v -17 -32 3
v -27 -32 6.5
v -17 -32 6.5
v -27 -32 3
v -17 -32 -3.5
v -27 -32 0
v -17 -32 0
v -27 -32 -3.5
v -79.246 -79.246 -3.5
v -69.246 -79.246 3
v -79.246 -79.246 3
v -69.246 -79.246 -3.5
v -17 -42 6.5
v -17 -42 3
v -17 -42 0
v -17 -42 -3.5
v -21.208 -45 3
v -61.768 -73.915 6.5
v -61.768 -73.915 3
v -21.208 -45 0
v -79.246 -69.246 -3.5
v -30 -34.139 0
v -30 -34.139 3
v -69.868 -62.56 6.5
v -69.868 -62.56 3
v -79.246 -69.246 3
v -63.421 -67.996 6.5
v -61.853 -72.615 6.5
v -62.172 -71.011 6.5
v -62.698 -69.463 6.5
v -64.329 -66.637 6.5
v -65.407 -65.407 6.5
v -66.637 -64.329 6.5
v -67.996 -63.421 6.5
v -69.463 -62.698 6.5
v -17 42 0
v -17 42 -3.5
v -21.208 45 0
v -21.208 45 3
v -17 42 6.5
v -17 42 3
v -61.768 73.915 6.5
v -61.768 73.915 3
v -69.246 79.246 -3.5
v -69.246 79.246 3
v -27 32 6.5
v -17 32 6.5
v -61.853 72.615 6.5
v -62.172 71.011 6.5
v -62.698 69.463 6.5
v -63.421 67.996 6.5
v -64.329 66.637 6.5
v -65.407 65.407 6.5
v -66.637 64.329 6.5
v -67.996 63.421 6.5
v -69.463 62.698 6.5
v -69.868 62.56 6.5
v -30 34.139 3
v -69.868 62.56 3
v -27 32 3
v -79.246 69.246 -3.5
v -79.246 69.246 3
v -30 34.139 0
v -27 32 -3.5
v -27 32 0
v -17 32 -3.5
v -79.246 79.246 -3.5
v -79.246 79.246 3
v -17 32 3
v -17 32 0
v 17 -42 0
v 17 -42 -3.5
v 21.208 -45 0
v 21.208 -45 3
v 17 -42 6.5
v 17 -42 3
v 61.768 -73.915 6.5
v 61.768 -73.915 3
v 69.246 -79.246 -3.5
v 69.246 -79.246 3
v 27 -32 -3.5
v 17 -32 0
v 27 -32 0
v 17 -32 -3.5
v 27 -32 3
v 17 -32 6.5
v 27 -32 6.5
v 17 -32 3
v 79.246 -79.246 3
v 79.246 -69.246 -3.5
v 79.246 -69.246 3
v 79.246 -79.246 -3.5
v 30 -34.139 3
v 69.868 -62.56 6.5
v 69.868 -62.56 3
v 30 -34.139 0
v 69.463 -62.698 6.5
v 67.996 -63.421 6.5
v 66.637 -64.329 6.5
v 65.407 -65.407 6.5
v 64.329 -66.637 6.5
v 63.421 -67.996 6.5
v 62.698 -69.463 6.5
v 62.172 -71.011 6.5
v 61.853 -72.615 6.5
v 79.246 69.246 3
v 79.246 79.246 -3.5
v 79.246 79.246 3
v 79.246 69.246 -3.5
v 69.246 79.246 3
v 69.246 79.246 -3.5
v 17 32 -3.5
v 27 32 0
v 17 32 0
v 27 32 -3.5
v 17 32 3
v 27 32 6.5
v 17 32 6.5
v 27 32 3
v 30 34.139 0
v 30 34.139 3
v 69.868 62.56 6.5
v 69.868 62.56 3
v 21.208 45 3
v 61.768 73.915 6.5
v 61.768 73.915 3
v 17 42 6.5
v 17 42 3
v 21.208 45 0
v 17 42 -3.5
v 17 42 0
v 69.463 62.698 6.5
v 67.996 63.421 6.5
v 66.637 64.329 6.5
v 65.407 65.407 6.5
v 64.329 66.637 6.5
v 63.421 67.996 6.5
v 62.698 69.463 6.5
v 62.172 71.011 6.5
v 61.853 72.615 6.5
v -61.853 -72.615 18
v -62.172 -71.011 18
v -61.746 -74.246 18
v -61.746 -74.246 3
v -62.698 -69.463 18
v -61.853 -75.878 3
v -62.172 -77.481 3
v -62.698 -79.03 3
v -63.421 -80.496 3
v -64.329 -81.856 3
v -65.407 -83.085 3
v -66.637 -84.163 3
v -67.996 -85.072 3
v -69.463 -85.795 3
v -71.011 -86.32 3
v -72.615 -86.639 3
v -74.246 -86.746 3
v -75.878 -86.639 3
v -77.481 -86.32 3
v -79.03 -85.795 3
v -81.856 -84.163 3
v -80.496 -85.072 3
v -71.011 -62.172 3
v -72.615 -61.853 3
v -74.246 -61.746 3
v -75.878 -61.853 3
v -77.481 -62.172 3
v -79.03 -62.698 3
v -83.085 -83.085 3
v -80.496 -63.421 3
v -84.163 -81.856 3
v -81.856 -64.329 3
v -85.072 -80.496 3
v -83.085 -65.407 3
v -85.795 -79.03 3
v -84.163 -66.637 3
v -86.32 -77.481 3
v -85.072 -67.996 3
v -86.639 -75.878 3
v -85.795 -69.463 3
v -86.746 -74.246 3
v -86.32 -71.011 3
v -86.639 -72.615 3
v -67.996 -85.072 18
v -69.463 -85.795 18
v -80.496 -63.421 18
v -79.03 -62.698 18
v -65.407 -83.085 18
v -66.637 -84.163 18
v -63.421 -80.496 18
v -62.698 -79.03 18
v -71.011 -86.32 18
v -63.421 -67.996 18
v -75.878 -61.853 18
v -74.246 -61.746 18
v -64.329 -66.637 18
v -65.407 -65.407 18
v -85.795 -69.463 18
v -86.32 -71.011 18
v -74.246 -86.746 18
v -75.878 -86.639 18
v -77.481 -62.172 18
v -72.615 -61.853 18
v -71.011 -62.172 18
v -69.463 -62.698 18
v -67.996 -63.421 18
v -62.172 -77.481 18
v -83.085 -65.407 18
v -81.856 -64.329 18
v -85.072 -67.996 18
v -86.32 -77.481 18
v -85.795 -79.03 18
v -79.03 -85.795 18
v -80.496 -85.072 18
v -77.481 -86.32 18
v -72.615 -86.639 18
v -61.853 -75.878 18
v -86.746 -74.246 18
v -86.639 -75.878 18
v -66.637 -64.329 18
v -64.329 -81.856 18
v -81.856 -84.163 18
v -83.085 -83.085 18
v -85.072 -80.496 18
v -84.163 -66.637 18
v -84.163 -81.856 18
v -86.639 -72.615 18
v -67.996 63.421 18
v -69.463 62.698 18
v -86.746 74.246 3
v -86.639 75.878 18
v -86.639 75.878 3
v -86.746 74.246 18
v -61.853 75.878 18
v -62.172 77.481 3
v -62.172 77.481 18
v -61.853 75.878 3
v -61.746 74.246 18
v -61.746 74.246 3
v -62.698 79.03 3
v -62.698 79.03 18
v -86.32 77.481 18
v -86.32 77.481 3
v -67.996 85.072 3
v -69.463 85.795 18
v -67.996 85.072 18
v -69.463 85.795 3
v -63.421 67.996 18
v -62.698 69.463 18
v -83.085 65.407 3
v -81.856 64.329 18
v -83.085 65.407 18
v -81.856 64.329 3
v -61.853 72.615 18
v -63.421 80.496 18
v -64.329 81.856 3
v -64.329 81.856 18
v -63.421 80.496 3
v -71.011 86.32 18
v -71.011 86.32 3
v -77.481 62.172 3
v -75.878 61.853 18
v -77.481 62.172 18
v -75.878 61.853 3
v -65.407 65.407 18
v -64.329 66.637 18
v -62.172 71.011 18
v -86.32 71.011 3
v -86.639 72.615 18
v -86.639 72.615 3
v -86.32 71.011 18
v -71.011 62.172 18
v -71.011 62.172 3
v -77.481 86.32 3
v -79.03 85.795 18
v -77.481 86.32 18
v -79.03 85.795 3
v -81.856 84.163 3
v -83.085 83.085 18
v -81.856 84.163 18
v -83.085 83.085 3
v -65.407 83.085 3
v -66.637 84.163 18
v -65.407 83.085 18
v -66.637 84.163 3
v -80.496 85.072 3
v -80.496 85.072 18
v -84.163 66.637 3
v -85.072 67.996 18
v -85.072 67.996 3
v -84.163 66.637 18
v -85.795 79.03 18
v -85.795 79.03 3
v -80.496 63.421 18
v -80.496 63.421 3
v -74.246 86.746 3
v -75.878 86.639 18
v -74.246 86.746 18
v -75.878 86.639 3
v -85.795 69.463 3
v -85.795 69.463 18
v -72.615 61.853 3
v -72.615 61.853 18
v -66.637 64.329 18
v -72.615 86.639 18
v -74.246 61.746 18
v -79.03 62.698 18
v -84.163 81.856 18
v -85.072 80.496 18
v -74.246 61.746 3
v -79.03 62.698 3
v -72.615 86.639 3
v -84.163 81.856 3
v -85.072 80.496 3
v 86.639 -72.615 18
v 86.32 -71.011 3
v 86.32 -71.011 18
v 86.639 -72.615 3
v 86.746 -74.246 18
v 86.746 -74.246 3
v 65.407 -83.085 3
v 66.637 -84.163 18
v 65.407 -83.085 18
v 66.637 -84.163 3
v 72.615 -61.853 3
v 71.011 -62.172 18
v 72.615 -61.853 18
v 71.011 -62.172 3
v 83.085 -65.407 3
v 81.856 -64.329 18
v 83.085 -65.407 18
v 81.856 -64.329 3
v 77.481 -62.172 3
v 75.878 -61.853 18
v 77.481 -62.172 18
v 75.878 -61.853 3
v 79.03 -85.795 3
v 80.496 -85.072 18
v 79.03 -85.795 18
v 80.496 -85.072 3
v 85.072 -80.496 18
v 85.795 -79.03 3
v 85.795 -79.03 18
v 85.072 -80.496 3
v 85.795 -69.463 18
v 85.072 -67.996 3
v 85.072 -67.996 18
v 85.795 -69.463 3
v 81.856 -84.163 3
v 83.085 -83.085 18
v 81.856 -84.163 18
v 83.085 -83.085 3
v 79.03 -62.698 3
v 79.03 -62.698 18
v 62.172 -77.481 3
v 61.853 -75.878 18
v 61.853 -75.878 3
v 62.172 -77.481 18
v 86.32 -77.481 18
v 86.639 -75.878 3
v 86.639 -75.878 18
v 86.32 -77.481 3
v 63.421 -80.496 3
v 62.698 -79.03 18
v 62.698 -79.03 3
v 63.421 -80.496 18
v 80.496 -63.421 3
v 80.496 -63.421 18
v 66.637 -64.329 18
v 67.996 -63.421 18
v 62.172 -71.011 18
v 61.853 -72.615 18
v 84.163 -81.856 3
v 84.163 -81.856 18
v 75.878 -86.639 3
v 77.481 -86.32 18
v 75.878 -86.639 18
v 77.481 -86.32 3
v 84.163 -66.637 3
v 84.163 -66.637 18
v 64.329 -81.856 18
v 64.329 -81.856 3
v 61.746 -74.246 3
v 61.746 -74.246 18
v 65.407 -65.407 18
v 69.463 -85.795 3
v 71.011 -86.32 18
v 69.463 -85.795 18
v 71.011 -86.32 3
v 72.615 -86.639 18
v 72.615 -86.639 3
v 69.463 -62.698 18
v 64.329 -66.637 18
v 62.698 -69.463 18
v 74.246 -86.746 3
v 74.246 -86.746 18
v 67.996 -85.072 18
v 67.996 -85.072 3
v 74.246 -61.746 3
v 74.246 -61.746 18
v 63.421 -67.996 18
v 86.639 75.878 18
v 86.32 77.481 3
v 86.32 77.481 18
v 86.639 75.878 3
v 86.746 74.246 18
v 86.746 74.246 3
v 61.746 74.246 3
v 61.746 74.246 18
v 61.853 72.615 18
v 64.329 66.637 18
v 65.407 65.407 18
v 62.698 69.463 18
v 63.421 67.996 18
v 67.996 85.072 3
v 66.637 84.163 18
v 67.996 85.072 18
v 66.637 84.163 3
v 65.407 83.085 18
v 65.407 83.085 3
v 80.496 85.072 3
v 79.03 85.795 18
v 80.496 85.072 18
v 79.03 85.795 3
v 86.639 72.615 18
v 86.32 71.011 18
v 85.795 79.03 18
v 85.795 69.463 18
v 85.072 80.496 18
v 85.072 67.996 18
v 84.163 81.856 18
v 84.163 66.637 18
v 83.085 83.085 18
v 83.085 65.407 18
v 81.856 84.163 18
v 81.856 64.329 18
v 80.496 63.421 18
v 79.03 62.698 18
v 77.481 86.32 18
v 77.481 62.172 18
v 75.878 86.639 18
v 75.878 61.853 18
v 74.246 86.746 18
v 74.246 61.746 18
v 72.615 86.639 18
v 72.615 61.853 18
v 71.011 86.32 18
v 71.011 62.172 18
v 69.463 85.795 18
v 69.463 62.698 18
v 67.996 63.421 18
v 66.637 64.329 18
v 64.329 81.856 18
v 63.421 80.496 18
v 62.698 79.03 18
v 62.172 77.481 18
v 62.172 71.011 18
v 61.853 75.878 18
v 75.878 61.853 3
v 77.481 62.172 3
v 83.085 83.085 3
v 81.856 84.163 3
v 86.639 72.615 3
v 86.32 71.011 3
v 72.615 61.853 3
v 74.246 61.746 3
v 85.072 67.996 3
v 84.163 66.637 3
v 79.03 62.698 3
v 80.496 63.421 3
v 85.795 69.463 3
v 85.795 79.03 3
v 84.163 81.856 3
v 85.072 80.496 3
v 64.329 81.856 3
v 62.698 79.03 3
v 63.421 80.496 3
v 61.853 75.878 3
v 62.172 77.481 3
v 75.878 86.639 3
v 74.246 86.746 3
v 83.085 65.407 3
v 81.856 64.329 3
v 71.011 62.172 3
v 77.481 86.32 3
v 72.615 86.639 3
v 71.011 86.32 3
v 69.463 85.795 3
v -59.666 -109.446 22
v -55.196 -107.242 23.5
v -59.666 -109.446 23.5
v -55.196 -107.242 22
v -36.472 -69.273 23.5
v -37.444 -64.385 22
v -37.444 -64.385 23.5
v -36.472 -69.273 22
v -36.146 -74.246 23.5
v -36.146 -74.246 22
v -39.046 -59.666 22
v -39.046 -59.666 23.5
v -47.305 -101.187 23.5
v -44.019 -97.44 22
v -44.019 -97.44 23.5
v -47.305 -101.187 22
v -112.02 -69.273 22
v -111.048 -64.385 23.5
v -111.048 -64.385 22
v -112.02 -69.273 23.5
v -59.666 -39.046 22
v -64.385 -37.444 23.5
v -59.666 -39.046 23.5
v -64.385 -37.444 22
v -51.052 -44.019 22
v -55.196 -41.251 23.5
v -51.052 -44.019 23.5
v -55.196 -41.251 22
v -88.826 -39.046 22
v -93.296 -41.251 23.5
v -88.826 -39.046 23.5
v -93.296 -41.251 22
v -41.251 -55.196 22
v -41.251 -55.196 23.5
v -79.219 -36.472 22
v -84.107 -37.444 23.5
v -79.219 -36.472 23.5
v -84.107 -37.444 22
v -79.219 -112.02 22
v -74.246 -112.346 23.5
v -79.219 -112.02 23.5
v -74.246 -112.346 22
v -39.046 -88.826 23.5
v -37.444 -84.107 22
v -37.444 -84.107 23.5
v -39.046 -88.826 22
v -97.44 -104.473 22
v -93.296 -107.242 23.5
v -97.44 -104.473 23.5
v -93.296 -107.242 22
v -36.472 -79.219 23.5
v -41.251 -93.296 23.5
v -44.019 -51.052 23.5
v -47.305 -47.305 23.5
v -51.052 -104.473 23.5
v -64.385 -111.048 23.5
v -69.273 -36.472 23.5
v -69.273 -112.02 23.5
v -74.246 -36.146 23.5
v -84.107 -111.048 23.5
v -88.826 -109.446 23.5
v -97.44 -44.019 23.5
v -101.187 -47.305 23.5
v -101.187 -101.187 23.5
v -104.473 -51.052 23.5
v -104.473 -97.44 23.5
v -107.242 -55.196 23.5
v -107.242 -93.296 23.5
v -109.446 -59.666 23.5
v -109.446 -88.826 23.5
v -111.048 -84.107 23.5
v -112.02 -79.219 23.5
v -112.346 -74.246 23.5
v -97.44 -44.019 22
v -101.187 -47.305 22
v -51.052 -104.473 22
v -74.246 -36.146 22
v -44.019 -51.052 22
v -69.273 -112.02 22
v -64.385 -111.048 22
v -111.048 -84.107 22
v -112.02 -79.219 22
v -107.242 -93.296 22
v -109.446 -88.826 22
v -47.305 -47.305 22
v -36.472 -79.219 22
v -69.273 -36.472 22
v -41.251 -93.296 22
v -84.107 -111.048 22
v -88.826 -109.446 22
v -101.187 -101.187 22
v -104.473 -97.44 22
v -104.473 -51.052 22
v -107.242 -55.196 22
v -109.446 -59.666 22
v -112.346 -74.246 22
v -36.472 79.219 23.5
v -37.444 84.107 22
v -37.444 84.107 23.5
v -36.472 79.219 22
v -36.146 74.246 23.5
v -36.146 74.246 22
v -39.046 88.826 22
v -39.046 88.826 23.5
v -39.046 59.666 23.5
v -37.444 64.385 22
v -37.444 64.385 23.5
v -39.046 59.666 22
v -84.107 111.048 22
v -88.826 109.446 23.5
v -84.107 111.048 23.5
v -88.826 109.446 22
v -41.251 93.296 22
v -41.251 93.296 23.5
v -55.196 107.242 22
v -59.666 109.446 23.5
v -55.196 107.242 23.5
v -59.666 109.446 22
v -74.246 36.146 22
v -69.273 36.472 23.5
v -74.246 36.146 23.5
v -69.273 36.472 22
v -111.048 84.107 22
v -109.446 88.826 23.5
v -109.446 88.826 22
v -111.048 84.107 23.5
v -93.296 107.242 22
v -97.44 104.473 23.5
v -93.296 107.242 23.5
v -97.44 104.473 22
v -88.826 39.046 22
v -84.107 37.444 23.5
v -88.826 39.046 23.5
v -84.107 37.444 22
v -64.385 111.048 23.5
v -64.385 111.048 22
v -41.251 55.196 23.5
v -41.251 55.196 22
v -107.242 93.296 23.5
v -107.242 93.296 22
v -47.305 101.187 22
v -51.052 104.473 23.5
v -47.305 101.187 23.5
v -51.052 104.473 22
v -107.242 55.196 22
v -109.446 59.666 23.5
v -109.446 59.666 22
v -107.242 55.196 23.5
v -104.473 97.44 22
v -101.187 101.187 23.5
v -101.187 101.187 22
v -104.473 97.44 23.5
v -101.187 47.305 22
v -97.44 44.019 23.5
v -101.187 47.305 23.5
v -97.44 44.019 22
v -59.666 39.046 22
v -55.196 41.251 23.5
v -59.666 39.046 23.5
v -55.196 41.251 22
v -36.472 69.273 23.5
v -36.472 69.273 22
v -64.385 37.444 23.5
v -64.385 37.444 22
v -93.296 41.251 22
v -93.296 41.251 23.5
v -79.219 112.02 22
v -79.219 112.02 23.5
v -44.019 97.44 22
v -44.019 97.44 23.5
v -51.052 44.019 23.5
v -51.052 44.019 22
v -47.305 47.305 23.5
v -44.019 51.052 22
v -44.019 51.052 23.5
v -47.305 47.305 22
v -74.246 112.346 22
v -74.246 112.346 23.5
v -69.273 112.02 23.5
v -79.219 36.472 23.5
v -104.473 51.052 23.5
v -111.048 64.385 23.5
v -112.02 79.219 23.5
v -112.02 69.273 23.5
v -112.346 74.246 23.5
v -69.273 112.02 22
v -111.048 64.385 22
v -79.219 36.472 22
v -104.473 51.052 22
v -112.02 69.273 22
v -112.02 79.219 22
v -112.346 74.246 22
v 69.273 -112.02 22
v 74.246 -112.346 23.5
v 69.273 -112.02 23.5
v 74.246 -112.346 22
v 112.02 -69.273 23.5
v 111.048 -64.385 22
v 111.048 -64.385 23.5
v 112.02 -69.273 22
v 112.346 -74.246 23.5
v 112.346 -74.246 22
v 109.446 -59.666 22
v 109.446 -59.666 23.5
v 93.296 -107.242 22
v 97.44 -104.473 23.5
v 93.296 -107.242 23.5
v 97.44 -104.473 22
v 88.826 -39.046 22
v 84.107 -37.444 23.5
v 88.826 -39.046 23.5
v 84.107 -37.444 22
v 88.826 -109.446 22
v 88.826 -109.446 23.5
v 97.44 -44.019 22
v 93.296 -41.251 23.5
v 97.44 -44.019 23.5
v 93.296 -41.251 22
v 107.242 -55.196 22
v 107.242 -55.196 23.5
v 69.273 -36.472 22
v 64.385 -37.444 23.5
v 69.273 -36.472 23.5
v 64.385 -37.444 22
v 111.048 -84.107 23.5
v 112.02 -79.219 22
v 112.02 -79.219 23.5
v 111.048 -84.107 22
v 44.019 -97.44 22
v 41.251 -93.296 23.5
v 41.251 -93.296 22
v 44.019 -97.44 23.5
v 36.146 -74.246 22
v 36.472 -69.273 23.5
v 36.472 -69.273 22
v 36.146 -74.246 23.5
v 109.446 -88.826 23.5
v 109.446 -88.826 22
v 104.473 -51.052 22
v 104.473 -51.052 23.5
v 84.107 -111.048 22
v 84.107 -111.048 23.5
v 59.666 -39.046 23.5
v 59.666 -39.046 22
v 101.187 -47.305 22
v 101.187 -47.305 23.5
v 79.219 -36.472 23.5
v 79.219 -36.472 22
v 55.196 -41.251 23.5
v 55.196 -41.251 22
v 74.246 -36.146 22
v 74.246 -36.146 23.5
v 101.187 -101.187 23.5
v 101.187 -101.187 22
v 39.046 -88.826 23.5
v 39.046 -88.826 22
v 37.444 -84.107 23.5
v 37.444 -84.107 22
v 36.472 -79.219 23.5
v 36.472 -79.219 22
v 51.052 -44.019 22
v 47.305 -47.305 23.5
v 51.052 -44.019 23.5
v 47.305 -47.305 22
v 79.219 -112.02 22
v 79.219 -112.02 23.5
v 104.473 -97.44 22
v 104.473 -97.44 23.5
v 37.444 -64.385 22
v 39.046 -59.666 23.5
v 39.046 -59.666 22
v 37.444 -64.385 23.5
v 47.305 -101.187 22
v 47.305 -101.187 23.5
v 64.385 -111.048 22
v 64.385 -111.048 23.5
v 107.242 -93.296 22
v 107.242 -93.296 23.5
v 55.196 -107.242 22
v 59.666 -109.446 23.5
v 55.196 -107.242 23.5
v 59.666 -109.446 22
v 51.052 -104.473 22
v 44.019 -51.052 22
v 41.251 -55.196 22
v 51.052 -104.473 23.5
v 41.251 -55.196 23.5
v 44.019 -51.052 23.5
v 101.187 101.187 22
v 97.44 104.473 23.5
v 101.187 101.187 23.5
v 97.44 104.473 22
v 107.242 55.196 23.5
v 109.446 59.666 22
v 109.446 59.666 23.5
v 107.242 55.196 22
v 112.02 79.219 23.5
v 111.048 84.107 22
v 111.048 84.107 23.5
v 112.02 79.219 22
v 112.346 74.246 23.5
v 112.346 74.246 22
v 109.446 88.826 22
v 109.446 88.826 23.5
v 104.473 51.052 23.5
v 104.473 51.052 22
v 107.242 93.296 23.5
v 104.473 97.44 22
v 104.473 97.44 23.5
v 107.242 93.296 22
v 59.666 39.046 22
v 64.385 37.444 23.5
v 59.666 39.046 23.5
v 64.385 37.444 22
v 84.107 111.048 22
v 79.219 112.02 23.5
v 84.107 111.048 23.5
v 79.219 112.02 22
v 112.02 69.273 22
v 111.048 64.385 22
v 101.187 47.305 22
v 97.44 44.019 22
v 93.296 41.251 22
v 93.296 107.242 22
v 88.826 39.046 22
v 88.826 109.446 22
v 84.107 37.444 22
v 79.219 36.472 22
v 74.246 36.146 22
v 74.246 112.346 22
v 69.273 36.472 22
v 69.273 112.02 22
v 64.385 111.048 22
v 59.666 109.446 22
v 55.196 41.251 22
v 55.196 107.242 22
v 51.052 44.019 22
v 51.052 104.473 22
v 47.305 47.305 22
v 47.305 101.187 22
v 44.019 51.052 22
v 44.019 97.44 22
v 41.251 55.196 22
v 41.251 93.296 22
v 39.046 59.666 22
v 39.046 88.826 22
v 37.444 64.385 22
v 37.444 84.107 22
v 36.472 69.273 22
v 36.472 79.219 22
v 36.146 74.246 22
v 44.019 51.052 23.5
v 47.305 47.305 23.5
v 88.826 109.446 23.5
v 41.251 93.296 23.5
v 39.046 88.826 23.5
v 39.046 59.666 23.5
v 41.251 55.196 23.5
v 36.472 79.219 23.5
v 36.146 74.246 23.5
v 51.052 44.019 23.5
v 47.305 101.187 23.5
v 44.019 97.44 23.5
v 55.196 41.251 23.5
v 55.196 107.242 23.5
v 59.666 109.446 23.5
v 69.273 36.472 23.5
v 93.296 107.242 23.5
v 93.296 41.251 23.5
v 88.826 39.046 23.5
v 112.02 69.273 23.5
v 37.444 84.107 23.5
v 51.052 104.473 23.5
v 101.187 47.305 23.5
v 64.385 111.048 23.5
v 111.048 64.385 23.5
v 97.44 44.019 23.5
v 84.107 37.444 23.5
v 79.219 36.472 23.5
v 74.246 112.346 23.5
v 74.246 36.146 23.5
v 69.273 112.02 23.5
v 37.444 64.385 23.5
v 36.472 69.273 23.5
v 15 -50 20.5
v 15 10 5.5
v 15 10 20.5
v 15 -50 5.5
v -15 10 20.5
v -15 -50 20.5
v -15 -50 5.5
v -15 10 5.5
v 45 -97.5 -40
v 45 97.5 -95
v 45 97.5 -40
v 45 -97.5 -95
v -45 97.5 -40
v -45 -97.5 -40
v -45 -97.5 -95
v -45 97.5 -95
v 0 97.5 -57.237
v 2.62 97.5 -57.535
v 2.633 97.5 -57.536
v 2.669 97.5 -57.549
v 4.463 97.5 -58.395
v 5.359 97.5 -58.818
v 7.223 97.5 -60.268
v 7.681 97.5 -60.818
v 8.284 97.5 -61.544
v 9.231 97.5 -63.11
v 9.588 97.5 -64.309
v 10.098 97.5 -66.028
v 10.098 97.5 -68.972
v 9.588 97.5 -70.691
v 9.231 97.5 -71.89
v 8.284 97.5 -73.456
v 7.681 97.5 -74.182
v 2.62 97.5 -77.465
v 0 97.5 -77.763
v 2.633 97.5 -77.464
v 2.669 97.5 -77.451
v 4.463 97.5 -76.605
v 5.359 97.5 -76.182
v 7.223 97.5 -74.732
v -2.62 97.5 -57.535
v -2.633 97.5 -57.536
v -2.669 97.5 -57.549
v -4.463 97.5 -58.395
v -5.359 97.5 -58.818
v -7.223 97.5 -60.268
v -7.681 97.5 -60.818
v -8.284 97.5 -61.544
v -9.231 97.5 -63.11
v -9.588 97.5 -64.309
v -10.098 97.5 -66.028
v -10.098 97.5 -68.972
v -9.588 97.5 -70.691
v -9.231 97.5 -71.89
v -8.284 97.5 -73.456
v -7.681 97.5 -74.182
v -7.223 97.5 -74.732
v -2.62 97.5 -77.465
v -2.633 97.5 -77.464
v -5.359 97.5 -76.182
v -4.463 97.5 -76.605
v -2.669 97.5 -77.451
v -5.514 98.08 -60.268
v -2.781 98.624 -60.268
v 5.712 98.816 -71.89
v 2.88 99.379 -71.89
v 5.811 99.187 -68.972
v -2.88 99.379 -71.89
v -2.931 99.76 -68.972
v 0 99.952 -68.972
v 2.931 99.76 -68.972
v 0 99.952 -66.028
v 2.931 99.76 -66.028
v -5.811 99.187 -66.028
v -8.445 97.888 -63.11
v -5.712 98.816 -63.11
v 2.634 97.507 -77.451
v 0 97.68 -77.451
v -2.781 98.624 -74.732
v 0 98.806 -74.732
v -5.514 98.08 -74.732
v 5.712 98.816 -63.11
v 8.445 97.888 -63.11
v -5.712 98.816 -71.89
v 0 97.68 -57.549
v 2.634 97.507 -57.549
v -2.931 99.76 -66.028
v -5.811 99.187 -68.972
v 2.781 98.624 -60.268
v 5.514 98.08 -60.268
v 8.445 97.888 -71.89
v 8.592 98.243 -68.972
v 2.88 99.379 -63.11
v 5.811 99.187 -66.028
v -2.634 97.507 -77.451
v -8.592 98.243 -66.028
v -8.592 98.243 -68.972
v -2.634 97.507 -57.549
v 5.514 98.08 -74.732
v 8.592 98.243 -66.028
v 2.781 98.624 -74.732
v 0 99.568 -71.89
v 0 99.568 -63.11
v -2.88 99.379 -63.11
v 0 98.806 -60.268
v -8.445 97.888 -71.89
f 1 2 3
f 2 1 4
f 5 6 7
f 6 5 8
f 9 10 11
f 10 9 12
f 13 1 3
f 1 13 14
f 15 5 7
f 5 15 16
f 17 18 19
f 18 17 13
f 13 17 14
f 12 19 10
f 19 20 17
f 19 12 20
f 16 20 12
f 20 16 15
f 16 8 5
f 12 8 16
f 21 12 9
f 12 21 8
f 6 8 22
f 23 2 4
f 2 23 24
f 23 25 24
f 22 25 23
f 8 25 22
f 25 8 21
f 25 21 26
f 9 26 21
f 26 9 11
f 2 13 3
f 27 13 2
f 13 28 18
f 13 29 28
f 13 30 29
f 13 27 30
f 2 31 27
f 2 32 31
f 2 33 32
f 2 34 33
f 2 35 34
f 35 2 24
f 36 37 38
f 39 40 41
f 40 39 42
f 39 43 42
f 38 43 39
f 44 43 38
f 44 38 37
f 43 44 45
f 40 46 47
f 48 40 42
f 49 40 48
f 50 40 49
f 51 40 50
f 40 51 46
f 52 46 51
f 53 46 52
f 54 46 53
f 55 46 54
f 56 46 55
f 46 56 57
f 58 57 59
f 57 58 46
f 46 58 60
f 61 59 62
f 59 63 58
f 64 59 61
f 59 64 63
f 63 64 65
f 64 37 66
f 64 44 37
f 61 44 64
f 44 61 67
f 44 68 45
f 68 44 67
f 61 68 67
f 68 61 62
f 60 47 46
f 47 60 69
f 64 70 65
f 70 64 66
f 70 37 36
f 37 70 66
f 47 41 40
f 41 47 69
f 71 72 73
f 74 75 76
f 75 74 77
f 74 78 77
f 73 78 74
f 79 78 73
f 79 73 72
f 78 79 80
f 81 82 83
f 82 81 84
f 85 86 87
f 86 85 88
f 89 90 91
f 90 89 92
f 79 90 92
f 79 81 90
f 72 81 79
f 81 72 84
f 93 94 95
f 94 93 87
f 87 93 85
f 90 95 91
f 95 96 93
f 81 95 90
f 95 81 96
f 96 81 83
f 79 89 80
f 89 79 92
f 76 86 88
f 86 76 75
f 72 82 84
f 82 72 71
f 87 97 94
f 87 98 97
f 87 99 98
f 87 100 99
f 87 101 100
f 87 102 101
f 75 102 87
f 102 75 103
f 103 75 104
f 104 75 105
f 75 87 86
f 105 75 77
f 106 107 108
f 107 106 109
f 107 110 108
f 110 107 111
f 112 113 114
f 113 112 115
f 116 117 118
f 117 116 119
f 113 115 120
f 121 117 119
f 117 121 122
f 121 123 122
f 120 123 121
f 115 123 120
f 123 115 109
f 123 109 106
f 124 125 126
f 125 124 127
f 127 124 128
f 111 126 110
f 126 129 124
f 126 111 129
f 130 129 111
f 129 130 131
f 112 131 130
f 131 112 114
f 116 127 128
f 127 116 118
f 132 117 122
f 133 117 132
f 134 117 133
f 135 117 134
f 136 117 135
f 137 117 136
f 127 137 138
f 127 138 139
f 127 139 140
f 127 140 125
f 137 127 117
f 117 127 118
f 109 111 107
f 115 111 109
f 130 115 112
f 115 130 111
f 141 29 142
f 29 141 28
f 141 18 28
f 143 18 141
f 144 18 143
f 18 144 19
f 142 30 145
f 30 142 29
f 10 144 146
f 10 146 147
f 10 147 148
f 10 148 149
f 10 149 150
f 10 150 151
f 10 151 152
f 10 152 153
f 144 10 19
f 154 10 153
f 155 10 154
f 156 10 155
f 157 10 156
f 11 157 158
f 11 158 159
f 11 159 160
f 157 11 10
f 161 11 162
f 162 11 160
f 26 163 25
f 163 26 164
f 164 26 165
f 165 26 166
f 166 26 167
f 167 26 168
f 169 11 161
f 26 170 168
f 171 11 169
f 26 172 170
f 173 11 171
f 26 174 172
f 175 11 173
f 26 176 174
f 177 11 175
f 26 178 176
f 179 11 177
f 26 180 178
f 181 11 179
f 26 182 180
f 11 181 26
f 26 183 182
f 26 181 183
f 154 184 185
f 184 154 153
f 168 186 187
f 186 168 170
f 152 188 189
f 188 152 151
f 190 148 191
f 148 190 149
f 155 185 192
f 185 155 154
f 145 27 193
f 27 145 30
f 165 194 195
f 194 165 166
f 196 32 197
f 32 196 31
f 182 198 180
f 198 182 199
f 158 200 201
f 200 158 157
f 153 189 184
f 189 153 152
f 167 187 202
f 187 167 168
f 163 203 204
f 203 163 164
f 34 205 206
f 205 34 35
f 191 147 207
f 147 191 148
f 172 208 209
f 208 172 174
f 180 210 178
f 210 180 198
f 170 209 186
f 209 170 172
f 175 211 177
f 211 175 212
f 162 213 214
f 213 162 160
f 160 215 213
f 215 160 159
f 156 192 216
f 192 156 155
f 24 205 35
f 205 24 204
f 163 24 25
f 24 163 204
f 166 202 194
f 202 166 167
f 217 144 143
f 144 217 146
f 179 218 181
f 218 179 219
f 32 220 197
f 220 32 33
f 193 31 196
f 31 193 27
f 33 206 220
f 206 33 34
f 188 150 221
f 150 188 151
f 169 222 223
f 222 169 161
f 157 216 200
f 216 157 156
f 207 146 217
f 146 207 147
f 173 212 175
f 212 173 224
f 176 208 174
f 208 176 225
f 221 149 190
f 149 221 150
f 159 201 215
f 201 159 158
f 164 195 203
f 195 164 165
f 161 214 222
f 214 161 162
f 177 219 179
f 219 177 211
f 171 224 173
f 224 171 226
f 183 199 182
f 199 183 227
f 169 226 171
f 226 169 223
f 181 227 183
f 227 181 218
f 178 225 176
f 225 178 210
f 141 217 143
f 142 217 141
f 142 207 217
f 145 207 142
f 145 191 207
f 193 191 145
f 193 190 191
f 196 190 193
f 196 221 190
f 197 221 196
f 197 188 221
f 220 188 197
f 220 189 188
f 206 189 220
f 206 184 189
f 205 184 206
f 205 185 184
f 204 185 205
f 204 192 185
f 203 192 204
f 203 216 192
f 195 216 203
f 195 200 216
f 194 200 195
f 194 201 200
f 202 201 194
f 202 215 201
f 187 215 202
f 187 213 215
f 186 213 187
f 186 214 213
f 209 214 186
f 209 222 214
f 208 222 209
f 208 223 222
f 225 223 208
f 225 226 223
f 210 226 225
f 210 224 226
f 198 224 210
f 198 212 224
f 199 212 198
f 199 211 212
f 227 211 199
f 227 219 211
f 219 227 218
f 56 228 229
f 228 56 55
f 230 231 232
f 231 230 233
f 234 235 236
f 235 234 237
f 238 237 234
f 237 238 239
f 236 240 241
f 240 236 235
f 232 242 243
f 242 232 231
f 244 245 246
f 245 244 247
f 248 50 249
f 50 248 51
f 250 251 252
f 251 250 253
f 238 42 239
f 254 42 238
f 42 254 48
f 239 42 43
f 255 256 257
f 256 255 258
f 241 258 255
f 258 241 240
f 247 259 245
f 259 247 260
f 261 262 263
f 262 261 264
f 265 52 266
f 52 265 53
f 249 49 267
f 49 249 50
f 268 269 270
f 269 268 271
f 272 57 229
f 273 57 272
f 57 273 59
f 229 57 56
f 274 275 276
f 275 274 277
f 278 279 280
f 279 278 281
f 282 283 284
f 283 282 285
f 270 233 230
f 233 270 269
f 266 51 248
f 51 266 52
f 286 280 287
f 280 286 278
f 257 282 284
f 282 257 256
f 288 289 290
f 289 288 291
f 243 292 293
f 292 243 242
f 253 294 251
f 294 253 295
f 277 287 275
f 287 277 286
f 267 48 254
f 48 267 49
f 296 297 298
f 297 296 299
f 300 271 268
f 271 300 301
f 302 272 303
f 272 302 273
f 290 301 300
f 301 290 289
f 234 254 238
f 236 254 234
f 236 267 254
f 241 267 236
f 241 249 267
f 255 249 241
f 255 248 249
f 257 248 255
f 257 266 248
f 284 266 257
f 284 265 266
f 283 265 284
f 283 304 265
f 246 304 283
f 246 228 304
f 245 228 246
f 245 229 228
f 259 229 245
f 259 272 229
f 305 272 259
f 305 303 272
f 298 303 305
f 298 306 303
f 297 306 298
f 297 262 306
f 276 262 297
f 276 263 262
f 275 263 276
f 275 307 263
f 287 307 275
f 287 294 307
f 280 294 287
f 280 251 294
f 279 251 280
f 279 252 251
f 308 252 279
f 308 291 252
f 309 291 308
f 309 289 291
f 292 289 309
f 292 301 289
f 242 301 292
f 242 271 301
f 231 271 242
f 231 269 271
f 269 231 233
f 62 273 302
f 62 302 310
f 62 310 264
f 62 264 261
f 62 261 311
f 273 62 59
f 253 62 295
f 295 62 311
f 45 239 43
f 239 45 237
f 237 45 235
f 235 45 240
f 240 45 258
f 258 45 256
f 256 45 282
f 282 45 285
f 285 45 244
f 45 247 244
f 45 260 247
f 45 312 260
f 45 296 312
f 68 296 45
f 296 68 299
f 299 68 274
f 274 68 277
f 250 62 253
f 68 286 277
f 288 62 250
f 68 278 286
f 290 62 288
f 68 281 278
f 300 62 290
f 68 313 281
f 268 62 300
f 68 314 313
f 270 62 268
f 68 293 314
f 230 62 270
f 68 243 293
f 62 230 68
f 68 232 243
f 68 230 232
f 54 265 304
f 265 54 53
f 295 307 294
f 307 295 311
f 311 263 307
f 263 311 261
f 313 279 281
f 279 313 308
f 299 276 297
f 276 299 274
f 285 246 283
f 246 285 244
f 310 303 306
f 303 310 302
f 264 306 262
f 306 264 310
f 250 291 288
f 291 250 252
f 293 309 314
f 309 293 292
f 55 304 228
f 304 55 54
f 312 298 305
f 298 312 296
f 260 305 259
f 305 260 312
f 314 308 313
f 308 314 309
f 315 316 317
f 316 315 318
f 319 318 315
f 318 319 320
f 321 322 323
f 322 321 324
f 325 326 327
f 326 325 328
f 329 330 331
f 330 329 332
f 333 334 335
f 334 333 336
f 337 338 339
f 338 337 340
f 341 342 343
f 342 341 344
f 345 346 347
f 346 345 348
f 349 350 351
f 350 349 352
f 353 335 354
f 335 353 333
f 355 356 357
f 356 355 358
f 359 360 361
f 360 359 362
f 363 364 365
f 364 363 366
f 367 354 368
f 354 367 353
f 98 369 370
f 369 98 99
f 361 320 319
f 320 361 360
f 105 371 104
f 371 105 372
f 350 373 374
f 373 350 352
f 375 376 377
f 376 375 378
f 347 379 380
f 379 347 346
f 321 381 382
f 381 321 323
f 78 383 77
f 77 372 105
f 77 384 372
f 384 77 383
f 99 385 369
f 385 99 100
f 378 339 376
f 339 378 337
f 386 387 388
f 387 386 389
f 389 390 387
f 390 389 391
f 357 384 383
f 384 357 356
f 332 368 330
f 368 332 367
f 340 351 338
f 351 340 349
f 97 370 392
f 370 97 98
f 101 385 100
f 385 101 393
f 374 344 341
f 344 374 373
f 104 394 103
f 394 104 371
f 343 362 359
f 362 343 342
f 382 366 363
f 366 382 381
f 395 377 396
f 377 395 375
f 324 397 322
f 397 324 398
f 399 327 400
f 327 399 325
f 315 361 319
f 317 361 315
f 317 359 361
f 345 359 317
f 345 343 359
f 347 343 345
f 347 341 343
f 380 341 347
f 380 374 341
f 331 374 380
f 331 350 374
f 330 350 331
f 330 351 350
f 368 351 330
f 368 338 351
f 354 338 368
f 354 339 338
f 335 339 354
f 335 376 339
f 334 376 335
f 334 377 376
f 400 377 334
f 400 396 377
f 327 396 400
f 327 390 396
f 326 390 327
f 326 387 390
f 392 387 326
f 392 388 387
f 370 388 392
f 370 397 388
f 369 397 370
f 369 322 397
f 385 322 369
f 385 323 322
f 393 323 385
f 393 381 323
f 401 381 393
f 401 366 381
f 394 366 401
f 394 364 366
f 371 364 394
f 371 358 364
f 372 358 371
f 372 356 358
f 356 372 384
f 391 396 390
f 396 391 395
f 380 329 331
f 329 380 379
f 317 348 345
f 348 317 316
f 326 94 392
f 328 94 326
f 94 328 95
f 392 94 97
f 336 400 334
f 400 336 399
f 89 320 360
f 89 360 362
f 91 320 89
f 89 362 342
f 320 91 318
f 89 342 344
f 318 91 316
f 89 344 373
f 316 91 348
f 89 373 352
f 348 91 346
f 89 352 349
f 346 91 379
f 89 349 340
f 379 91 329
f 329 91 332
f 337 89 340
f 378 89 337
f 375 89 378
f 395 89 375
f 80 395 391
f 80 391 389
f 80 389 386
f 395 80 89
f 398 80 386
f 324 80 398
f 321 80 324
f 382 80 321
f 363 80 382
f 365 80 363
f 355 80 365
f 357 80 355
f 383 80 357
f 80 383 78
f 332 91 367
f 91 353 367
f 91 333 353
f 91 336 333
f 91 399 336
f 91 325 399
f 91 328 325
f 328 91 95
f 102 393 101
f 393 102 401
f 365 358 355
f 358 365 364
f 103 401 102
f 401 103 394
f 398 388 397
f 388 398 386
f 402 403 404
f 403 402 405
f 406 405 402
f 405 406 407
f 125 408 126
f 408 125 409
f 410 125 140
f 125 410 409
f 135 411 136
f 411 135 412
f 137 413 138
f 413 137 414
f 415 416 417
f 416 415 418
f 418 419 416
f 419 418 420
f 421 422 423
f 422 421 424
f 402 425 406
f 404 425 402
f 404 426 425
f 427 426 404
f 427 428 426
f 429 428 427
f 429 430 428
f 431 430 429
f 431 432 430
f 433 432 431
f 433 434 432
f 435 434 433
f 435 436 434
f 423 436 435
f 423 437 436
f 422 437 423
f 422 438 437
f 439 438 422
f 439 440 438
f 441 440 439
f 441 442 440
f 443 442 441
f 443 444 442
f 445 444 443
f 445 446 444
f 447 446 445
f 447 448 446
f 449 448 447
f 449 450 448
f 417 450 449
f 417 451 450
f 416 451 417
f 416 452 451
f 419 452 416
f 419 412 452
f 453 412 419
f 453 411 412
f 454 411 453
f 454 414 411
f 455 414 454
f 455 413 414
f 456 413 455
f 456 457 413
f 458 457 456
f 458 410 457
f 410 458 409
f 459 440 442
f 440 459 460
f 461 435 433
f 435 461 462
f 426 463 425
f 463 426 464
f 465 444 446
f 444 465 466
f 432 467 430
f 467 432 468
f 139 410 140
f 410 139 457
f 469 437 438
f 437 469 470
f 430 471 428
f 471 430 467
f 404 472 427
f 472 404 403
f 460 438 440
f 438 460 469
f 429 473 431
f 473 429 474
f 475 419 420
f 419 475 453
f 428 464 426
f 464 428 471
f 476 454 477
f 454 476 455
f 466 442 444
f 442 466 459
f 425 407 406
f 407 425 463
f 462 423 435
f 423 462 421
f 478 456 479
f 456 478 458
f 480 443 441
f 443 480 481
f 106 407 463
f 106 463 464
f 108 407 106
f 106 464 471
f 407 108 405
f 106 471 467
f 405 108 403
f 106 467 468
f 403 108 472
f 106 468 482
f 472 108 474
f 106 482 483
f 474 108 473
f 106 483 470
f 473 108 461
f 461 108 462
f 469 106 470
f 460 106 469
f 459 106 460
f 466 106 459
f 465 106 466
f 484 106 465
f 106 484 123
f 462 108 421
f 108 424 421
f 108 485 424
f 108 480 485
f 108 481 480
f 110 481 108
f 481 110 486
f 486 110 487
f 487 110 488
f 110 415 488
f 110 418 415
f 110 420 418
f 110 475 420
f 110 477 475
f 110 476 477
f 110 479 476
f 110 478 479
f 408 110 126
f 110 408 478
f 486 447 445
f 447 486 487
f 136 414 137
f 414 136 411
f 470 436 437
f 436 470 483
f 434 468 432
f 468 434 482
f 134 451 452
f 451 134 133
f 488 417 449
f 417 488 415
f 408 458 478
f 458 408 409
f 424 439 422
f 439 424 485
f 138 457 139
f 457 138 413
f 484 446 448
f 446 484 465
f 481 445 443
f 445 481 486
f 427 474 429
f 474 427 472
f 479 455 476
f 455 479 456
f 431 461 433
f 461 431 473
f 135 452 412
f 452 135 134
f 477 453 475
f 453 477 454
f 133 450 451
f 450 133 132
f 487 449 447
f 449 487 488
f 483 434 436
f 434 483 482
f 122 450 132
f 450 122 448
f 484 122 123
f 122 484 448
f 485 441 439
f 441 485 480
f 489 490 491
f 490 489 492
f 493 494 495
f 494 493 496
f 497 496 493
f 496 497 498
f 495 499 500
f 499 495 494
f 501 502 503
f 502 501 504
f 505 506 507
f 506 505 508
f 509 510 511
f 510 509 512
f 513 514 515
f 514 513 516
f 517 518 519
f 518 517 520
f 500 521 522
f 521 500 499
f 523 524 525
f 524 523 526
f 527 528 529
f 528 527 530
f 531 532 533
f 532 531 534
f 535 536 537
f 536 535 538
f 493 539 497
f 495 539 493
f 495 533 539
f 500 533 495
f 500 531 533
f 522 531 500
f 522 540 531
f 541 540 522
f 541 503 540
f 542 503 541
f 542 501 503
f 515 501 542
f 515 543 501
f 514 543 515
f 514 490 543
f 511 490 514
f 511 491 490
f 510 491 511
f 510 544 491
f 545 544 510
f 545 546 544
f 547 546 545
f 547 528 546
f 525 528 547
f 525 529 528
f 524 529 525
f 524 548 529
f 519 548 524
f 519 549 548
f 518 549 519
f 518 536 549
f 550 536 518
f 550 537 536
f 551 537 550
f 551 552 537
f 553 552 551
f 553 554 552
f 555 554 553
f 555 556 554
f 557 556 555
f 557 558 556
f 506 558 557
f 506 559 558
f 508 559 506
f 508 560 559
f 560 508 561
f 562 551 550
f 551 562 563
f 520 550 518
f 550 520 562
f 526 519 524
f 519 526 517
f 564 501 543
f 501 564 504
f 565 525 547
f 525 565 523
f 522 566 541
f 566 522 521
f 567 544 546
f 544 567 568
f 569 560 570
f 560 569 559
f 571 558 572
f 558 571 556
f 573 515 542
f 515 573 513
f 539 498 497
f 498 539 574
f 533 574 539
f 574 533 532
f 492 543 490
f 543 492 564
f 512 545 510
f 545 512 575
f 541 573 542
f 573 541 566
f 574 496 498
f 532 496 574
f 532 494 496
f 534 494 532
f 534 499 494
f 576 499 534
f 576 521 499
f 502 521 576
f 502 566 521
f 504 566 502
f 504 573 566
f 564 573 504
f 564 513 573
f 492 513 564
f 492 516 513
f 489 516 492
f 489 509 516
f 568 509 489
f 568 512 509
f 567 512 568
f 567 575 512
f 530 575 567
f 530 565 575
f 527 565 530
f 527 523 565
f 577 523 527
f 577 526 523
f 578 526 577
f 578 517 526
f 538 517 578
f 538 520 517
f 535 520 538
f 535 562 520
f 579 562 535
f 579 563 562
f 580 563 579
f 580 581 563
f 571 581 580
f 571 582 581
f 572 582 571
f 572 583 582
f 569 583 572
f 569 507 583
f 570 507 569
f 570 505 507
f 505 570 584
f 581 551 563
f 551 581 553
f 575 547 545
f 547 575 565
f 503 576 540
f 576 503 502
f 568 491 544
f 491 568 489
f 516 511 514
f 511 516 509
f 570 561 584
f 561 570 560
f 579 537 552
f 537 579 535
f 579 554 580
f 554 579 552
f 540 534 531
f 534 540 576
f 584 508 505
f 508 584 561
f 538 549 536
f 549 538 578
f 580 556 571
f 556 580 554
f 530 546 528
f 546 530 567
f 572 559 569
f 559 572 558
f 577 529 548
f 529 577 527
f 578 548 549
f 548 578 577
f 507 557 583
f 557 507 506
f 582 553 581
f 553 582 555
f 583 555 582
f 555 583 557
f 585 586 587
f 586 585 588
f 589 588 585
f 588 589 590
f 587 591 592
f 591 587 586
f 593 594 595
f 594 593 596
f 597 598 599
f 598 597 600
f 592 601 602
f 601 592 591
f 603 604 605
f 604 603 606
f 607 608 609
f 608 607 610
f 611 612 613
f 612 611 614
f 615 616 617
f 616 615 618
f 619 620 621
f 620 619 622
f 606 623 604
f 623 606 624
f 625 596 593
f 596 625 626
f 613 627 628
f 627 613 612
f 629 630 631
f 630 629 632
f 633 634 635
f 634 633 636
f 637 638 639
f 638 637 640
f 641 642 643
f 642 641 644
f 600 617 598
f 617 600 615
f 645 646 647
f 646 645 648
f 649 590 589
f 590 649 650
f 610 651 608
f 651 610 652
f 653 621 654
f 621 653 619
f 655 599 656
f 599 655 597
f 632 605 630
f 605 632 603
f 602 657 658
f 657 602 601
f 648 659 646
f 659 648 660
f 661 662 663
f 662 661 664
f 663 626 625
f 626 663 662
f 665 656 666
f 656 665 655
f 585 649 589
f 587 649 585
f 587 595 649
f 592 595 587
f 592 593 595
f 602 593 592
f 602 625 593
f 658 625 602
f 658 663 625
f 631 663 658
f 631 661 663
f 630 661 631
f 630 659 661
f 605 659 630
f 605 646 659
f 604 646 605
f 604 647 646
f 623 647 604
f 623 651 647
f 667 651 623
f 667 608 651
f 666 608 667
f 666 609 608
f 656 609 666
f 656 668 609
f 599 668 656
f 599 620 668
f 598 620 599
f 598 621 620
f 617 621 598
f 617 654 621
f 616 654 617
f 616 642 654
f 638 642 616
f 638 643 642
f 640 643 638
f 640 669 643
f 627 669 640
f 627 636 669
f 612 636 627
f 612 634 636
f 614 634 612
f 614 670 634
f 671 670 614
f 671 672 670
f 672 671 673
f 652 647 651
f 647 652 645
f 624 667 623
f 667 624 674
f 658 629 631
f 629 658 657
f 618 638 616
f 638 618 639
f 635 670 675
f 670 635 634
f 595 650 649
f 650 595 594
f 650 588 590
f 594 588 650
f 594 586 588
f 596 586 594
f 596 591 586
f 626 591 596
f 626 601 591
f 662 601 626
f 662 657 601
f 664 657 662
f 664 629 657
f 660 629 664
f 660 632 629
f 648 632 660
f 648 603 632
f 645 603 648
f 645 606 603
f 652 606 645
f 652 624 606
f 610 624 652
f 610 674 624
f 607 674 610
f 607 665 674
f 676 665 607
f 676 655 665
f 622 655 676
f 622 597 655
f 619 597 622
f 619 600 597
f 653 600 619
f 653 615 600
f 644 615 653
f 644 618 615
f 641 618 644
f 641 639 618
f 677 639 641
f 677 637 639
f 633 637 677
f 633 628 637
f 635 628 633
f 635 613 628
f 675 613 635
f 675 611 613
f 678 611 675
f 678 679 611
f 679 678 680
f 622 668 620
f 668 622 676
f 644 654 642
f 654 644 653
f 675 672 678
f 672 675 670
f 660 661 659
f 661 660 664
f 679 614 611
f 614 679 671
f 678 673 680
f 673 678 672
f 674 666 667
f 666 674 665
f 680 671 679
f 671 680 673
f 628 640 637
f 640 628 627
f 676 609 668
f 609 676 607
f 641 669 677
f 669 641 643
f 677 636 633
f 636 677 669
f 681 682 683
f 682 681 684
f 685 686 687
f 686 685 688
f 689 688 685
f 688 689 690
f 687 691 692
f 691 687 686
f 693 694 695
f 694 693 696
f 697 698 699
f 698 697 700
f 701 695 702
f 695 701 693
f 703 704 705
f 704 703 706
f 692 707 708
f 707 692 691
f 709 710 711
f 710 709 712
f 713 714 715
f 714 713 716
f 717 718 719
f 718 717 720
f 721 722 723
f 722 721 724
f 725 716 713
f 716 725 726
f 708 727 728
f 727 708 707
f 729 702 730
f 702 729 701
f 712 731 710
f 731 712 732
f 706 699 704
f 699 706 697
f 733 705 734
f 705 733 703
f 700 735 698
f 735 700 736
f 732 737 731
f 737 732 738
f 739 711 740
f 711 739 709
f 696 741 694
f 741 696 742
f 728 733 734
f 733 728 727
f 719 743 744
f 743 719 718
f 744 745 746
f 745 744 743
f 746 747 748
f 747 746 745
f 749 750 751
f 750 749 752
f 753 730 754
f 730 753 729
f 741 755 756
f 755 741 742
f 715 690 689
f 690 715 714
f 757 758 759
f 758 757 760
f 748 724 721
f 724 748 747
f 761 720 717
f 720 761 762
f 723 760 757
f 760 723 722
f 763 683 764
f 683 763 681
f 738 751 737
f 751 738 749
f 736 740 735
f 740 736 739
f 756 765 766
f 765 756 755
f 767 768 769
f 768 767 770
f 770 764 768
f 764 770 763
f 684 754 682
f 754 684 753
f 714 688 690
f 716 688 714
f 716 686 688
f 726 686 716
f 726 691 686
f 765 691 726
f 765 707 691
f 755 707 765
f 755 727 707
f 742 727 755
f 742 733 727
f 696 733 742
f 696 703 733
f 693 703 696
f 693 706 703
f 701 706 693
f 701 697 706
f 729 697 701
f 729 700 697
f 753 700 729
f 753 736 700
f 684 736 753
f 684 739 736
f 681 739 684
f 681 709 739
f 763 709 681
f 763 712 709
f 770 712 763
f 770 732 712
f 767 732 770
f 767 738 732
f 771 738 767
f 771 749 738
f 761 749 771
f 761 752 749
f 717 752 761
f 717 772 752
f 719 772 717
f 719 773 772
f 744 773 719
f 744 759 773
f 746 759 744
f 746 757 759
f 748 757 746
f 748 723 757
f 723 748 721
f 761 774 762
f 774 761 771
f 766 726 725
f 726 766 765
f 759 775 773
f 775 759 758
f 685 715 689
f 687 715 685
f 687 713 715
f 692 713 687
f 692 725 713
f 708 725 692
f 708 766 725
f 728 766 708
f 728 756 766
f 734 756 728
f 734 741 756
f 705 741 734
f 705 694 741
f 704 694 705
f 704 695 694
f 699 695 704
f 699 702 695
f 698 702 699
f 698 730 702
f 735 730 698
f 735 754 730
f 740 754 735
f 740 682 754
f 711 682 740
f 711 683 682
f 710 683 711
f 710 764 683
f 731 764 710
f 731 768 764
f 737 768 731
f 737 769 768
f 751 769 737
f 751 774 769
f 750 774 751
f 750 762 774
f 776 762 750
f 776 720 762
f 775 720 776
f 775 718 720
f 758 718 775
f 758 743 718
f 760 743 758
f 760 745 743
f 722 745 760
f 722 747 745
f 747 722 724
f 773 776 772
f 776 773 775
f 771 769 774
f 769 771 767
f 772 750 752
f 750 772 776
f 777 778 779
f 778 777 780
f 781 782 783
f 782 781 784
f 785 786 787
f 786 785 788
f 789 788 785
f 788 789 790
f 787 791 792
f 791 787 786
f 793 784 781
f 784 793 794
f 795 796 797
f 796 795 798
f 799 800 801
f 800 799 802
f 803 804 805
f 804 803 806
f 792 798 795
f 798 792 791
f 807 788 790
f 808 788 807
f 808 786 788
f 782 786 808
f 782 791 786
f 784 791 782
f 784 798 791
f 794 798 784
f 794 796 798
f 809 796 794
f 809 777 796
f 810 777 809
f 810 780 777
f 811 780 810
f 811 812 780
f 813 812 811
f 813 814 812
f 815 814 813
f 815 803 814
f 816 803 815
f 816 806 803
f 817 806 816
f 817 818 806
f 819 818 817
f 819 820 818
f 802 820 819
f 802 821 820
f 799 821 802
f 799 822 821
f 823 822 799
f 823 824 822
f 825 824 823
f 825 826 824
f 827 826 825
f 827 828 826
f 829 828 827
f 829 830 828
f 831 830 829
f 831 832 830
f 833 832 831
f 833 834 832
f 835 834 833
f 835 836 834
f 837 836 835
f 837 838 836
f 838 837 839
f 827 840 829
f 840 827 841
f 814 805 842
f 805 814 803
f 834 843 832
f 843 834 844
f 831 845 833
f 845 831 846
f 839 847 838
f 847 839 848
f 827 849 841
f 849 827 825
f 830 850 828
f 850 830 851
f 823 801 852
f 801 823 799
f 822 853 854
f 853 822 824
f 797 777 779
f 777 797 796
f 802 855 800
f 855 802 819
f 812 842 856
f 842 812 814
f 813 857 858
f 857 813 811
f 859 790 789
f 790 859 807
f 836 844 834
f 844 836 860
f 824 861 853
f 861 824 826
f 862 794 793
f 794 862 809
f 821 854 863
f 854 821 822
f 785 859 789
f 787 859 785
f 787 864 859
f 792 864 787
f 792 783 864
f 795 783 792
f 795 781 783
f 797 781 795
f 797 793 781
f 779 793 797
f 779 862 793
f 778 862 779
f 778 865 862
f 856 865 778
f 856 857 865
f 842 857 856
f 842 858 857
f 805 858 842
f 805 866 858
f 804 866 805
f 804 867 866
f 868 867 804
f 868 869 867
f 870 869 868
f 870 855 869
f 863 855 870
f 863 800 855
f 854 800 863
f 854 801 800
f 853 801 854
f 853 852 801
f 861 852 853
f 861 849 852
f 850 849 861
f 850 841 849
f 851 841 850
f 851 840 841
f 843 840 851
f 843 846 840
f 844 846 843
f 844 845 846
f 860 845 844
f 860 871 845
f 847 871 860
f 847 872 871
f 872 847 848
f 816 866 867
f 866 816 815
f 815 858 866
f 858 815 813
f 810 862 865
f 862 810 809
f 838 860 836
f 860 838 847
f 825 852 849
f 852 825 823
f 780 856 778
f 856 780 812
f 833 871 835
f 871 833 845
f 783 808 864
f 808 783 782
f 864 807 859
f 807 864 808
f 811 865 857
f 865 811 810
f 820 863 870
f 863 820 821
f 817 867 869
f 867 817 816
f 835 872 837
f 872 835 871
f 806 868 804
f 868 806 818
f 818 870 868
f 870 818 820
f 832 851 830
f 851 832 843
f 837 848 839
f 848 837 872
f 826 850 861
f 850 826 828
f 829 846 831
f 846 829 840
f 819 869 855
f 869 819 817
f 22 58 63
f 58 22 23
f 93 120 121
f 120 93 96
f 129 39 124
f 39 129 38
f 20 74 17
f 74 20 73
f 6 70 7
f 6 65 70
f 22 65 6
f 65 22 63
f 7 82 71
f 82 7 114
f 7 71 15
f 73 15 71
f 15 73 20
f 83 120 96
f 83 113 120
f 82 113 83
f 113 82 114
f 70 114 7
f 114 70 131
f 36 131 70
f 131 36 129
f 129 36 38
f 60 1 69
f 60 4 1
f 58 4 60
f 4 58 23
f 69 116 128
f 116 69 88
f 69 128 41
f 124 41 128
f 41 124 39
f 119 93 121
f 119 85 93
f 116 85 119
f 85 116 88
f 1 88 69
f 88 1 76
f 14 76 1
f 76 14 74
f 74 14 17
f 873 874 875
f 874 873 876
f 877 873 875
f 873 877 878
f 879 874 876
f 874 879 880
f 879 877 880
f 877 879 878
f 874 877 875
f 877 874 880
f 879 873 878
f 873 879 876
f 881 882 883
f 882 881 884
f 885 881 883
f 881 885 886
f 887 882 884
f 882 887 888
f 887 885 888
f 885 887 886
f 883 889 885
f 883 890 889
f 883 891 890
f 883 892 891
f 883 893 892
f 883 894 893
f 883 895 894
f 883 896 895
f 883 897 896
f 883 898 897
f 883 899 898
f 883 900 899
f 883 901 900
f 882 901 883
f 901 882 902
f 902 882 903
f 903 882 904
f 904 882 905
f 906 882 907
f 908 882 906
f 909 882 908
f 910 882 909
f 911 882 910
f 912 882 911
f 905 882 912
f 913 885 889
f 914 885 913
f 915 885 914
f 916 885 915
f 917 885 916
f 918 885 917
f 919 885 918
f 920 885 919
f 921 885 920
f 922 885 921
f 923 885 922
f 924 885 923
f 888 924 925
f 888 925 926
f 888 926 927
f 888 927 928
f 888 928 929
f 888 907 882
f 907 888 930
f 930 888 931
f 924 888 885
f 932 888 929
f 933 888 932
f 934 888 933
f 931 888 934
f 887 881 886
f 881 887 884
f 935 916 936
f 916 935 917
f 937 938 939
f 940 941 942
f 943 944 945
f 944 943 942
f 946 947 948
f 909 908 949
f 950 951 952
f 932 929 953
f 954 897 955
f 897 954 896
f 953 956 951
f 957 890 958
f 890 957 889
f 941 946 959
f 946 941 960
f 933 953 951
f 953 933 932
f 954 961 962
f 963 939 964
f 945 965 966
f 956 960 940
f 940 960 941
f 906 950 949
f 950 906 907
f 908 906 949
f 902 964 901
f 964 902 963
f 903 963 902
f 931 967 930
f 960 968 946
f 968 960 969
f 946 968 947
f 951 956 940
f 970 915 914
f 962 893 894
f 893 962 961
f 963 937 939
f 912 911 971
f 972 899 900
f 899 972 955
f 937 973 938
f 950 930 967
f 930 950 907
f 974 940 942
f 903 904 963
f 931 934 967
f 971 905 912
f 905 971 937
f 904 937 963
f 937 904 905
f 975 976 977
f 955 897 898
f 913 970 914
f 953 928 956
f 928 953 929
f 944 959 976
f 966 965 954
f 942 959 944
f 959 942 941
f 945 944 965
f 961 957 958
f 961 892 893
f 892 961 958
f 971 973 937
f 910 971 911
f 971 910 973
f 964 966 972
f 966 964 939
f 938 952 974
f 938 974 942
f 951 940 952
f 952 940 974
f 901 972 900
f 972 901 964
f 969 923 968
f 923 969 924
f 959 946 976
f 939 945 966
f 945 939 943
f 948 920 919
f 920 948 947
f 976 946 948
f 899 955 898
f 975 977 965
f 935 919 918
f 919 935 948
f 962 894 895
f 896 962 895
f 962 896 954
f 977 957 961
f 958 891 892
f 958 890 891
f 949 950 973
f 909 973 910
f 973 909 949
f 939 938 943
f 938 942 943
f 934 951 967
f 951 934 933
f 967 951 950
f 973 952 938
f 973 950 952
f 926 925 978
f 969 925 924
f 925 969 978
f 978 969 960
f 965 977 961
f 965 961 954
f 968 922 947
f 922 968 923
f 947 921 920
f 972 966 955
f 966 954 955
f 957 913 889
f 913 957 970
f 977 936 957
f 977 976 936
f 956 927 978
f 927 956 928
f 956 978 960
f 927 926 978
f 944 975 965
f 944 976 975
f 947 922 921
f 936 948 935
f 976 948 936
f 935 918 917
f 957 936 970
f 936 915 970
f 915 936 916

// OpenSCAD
// assembly_check.scad — 機体全体の幾何チェック（組み上がるかの証拠）
// 実測値と確定部品で全体を組み、プロペラ干渉と寸法の整合を目で確認する。
// 「仮定」印の数字はバズの実測（Issue #1, #2）で差し替える。

$fn = 48;

// ==== 実測・確定値 ==========================================
prop_diag = 210;                  // ダミープロペラ対角スパン（実測）
motor_xy  = prop_diag / 2 / sqrt(2);  // モーター位置 = ±74.2mm
prop_d    = 76.2;                 // 3インチプロペラ直径（確定構成）
plate_w = 60; plate_l = 90; plate_t = 3;   // トッププレート（設計済み）

// ==== 部品の想定寸法 ========================================
arm_w = 10; arm_t = 10;           // カーボン角パイプ10×10（両対応案の片方）
motor_d = 25; motor_h = 15;       // F2004クラスの外形
prop_z  = plate_t + motor_h + 4;  // プロペラ回転面の高さ

// ==== バズの外形（★仮定 — 実測で差し替え）==================
buzz_l = 195;   // 全高195mm（実測: 19.5cm）→ うつ伏せ飛行姿勢で前後方向
buzz_w = 90;    // ★仮定: 腕を体側に沿わせたポーズの最大幅
buzz_t = 55;    // ★仮定: 胸の厚み
lid_h  = 40;    // ★仮定: ジェットパック上蓋からバズ背面までの高さ

// ==== 電池（重心調整の可変要素）=============================
batt = [30, 60, 15]; batt_y = -20;   // プレート上・前後に動かせる

// ==== 検算をコンソールに出す ================================
echo(str("モーター位置: ±", motor_xy, "mm（対角", prop_diag, "mm）"));
echo(str("隣接プロペラの隙間: ", prop_diag/sqrt(2) - prop_d, "mm（>0で干渉なし）"));
echo(str("プロペラ円の内側の縁: 中心から", motor_xy - prop_d/2, "mm（体の幅はこの内側×2に収める）"));

// ==== モデル ================================================
// トッププレート
color("gray") linear_extrude(plate_t)
  offset(r=6) square([plate_w-12, plate_l-12], center=true);

// アーム4本（プレート角→モーター位置、45°）
for (sx=[-1,1], sy=[-1,1])
  color([0.2,0.2,0.2])
    hull() {
      translate([sx*22, sy*37, plate_t/2]) cube([arm_w, arm_w, arm_t], center=true);
      translate([sx*motor_xy, sy*motor_xy, plate_t/2]) cube([arm_w, arm_w, arm_t], center=true);
    }

// モーター4基
for (sx=[-1,1], sy=[-1,1])
  color("orange") translate([sx*motor_xy, sy*motor_xy, plate_t])
    cylinder(d=motor_d, h=motor_h);

// プロペラ回転面（半透明の円盤）
for (sx=[-1,1], sy=[-1,1])
  color([1,0,0,0.35]) translate([sx*motor_xy, sy*motor_xy, prop_z])
    cylinder(d=prop_d, h=1.5);

// 電池
color("green") translate([0, batt_y, plate_t + arm_t])
  cube(batt, center=true);

// バズ（うつ伏せ・上蓋の下にぶら下がる想定の外形箱）
color([0.3,0.5,1,0.55]) translate([0, 0, -lid_h - buzz_t/2])
  cube([buzz_w, buzz_l, buzz_t], center=true);
// 頭の目印（+Y側）
color([0.3,0.5,1,0.7]) translate([0, buzz_l/2 - 20, -lid_h - buzz_t/2])
  sphere(d=45);
